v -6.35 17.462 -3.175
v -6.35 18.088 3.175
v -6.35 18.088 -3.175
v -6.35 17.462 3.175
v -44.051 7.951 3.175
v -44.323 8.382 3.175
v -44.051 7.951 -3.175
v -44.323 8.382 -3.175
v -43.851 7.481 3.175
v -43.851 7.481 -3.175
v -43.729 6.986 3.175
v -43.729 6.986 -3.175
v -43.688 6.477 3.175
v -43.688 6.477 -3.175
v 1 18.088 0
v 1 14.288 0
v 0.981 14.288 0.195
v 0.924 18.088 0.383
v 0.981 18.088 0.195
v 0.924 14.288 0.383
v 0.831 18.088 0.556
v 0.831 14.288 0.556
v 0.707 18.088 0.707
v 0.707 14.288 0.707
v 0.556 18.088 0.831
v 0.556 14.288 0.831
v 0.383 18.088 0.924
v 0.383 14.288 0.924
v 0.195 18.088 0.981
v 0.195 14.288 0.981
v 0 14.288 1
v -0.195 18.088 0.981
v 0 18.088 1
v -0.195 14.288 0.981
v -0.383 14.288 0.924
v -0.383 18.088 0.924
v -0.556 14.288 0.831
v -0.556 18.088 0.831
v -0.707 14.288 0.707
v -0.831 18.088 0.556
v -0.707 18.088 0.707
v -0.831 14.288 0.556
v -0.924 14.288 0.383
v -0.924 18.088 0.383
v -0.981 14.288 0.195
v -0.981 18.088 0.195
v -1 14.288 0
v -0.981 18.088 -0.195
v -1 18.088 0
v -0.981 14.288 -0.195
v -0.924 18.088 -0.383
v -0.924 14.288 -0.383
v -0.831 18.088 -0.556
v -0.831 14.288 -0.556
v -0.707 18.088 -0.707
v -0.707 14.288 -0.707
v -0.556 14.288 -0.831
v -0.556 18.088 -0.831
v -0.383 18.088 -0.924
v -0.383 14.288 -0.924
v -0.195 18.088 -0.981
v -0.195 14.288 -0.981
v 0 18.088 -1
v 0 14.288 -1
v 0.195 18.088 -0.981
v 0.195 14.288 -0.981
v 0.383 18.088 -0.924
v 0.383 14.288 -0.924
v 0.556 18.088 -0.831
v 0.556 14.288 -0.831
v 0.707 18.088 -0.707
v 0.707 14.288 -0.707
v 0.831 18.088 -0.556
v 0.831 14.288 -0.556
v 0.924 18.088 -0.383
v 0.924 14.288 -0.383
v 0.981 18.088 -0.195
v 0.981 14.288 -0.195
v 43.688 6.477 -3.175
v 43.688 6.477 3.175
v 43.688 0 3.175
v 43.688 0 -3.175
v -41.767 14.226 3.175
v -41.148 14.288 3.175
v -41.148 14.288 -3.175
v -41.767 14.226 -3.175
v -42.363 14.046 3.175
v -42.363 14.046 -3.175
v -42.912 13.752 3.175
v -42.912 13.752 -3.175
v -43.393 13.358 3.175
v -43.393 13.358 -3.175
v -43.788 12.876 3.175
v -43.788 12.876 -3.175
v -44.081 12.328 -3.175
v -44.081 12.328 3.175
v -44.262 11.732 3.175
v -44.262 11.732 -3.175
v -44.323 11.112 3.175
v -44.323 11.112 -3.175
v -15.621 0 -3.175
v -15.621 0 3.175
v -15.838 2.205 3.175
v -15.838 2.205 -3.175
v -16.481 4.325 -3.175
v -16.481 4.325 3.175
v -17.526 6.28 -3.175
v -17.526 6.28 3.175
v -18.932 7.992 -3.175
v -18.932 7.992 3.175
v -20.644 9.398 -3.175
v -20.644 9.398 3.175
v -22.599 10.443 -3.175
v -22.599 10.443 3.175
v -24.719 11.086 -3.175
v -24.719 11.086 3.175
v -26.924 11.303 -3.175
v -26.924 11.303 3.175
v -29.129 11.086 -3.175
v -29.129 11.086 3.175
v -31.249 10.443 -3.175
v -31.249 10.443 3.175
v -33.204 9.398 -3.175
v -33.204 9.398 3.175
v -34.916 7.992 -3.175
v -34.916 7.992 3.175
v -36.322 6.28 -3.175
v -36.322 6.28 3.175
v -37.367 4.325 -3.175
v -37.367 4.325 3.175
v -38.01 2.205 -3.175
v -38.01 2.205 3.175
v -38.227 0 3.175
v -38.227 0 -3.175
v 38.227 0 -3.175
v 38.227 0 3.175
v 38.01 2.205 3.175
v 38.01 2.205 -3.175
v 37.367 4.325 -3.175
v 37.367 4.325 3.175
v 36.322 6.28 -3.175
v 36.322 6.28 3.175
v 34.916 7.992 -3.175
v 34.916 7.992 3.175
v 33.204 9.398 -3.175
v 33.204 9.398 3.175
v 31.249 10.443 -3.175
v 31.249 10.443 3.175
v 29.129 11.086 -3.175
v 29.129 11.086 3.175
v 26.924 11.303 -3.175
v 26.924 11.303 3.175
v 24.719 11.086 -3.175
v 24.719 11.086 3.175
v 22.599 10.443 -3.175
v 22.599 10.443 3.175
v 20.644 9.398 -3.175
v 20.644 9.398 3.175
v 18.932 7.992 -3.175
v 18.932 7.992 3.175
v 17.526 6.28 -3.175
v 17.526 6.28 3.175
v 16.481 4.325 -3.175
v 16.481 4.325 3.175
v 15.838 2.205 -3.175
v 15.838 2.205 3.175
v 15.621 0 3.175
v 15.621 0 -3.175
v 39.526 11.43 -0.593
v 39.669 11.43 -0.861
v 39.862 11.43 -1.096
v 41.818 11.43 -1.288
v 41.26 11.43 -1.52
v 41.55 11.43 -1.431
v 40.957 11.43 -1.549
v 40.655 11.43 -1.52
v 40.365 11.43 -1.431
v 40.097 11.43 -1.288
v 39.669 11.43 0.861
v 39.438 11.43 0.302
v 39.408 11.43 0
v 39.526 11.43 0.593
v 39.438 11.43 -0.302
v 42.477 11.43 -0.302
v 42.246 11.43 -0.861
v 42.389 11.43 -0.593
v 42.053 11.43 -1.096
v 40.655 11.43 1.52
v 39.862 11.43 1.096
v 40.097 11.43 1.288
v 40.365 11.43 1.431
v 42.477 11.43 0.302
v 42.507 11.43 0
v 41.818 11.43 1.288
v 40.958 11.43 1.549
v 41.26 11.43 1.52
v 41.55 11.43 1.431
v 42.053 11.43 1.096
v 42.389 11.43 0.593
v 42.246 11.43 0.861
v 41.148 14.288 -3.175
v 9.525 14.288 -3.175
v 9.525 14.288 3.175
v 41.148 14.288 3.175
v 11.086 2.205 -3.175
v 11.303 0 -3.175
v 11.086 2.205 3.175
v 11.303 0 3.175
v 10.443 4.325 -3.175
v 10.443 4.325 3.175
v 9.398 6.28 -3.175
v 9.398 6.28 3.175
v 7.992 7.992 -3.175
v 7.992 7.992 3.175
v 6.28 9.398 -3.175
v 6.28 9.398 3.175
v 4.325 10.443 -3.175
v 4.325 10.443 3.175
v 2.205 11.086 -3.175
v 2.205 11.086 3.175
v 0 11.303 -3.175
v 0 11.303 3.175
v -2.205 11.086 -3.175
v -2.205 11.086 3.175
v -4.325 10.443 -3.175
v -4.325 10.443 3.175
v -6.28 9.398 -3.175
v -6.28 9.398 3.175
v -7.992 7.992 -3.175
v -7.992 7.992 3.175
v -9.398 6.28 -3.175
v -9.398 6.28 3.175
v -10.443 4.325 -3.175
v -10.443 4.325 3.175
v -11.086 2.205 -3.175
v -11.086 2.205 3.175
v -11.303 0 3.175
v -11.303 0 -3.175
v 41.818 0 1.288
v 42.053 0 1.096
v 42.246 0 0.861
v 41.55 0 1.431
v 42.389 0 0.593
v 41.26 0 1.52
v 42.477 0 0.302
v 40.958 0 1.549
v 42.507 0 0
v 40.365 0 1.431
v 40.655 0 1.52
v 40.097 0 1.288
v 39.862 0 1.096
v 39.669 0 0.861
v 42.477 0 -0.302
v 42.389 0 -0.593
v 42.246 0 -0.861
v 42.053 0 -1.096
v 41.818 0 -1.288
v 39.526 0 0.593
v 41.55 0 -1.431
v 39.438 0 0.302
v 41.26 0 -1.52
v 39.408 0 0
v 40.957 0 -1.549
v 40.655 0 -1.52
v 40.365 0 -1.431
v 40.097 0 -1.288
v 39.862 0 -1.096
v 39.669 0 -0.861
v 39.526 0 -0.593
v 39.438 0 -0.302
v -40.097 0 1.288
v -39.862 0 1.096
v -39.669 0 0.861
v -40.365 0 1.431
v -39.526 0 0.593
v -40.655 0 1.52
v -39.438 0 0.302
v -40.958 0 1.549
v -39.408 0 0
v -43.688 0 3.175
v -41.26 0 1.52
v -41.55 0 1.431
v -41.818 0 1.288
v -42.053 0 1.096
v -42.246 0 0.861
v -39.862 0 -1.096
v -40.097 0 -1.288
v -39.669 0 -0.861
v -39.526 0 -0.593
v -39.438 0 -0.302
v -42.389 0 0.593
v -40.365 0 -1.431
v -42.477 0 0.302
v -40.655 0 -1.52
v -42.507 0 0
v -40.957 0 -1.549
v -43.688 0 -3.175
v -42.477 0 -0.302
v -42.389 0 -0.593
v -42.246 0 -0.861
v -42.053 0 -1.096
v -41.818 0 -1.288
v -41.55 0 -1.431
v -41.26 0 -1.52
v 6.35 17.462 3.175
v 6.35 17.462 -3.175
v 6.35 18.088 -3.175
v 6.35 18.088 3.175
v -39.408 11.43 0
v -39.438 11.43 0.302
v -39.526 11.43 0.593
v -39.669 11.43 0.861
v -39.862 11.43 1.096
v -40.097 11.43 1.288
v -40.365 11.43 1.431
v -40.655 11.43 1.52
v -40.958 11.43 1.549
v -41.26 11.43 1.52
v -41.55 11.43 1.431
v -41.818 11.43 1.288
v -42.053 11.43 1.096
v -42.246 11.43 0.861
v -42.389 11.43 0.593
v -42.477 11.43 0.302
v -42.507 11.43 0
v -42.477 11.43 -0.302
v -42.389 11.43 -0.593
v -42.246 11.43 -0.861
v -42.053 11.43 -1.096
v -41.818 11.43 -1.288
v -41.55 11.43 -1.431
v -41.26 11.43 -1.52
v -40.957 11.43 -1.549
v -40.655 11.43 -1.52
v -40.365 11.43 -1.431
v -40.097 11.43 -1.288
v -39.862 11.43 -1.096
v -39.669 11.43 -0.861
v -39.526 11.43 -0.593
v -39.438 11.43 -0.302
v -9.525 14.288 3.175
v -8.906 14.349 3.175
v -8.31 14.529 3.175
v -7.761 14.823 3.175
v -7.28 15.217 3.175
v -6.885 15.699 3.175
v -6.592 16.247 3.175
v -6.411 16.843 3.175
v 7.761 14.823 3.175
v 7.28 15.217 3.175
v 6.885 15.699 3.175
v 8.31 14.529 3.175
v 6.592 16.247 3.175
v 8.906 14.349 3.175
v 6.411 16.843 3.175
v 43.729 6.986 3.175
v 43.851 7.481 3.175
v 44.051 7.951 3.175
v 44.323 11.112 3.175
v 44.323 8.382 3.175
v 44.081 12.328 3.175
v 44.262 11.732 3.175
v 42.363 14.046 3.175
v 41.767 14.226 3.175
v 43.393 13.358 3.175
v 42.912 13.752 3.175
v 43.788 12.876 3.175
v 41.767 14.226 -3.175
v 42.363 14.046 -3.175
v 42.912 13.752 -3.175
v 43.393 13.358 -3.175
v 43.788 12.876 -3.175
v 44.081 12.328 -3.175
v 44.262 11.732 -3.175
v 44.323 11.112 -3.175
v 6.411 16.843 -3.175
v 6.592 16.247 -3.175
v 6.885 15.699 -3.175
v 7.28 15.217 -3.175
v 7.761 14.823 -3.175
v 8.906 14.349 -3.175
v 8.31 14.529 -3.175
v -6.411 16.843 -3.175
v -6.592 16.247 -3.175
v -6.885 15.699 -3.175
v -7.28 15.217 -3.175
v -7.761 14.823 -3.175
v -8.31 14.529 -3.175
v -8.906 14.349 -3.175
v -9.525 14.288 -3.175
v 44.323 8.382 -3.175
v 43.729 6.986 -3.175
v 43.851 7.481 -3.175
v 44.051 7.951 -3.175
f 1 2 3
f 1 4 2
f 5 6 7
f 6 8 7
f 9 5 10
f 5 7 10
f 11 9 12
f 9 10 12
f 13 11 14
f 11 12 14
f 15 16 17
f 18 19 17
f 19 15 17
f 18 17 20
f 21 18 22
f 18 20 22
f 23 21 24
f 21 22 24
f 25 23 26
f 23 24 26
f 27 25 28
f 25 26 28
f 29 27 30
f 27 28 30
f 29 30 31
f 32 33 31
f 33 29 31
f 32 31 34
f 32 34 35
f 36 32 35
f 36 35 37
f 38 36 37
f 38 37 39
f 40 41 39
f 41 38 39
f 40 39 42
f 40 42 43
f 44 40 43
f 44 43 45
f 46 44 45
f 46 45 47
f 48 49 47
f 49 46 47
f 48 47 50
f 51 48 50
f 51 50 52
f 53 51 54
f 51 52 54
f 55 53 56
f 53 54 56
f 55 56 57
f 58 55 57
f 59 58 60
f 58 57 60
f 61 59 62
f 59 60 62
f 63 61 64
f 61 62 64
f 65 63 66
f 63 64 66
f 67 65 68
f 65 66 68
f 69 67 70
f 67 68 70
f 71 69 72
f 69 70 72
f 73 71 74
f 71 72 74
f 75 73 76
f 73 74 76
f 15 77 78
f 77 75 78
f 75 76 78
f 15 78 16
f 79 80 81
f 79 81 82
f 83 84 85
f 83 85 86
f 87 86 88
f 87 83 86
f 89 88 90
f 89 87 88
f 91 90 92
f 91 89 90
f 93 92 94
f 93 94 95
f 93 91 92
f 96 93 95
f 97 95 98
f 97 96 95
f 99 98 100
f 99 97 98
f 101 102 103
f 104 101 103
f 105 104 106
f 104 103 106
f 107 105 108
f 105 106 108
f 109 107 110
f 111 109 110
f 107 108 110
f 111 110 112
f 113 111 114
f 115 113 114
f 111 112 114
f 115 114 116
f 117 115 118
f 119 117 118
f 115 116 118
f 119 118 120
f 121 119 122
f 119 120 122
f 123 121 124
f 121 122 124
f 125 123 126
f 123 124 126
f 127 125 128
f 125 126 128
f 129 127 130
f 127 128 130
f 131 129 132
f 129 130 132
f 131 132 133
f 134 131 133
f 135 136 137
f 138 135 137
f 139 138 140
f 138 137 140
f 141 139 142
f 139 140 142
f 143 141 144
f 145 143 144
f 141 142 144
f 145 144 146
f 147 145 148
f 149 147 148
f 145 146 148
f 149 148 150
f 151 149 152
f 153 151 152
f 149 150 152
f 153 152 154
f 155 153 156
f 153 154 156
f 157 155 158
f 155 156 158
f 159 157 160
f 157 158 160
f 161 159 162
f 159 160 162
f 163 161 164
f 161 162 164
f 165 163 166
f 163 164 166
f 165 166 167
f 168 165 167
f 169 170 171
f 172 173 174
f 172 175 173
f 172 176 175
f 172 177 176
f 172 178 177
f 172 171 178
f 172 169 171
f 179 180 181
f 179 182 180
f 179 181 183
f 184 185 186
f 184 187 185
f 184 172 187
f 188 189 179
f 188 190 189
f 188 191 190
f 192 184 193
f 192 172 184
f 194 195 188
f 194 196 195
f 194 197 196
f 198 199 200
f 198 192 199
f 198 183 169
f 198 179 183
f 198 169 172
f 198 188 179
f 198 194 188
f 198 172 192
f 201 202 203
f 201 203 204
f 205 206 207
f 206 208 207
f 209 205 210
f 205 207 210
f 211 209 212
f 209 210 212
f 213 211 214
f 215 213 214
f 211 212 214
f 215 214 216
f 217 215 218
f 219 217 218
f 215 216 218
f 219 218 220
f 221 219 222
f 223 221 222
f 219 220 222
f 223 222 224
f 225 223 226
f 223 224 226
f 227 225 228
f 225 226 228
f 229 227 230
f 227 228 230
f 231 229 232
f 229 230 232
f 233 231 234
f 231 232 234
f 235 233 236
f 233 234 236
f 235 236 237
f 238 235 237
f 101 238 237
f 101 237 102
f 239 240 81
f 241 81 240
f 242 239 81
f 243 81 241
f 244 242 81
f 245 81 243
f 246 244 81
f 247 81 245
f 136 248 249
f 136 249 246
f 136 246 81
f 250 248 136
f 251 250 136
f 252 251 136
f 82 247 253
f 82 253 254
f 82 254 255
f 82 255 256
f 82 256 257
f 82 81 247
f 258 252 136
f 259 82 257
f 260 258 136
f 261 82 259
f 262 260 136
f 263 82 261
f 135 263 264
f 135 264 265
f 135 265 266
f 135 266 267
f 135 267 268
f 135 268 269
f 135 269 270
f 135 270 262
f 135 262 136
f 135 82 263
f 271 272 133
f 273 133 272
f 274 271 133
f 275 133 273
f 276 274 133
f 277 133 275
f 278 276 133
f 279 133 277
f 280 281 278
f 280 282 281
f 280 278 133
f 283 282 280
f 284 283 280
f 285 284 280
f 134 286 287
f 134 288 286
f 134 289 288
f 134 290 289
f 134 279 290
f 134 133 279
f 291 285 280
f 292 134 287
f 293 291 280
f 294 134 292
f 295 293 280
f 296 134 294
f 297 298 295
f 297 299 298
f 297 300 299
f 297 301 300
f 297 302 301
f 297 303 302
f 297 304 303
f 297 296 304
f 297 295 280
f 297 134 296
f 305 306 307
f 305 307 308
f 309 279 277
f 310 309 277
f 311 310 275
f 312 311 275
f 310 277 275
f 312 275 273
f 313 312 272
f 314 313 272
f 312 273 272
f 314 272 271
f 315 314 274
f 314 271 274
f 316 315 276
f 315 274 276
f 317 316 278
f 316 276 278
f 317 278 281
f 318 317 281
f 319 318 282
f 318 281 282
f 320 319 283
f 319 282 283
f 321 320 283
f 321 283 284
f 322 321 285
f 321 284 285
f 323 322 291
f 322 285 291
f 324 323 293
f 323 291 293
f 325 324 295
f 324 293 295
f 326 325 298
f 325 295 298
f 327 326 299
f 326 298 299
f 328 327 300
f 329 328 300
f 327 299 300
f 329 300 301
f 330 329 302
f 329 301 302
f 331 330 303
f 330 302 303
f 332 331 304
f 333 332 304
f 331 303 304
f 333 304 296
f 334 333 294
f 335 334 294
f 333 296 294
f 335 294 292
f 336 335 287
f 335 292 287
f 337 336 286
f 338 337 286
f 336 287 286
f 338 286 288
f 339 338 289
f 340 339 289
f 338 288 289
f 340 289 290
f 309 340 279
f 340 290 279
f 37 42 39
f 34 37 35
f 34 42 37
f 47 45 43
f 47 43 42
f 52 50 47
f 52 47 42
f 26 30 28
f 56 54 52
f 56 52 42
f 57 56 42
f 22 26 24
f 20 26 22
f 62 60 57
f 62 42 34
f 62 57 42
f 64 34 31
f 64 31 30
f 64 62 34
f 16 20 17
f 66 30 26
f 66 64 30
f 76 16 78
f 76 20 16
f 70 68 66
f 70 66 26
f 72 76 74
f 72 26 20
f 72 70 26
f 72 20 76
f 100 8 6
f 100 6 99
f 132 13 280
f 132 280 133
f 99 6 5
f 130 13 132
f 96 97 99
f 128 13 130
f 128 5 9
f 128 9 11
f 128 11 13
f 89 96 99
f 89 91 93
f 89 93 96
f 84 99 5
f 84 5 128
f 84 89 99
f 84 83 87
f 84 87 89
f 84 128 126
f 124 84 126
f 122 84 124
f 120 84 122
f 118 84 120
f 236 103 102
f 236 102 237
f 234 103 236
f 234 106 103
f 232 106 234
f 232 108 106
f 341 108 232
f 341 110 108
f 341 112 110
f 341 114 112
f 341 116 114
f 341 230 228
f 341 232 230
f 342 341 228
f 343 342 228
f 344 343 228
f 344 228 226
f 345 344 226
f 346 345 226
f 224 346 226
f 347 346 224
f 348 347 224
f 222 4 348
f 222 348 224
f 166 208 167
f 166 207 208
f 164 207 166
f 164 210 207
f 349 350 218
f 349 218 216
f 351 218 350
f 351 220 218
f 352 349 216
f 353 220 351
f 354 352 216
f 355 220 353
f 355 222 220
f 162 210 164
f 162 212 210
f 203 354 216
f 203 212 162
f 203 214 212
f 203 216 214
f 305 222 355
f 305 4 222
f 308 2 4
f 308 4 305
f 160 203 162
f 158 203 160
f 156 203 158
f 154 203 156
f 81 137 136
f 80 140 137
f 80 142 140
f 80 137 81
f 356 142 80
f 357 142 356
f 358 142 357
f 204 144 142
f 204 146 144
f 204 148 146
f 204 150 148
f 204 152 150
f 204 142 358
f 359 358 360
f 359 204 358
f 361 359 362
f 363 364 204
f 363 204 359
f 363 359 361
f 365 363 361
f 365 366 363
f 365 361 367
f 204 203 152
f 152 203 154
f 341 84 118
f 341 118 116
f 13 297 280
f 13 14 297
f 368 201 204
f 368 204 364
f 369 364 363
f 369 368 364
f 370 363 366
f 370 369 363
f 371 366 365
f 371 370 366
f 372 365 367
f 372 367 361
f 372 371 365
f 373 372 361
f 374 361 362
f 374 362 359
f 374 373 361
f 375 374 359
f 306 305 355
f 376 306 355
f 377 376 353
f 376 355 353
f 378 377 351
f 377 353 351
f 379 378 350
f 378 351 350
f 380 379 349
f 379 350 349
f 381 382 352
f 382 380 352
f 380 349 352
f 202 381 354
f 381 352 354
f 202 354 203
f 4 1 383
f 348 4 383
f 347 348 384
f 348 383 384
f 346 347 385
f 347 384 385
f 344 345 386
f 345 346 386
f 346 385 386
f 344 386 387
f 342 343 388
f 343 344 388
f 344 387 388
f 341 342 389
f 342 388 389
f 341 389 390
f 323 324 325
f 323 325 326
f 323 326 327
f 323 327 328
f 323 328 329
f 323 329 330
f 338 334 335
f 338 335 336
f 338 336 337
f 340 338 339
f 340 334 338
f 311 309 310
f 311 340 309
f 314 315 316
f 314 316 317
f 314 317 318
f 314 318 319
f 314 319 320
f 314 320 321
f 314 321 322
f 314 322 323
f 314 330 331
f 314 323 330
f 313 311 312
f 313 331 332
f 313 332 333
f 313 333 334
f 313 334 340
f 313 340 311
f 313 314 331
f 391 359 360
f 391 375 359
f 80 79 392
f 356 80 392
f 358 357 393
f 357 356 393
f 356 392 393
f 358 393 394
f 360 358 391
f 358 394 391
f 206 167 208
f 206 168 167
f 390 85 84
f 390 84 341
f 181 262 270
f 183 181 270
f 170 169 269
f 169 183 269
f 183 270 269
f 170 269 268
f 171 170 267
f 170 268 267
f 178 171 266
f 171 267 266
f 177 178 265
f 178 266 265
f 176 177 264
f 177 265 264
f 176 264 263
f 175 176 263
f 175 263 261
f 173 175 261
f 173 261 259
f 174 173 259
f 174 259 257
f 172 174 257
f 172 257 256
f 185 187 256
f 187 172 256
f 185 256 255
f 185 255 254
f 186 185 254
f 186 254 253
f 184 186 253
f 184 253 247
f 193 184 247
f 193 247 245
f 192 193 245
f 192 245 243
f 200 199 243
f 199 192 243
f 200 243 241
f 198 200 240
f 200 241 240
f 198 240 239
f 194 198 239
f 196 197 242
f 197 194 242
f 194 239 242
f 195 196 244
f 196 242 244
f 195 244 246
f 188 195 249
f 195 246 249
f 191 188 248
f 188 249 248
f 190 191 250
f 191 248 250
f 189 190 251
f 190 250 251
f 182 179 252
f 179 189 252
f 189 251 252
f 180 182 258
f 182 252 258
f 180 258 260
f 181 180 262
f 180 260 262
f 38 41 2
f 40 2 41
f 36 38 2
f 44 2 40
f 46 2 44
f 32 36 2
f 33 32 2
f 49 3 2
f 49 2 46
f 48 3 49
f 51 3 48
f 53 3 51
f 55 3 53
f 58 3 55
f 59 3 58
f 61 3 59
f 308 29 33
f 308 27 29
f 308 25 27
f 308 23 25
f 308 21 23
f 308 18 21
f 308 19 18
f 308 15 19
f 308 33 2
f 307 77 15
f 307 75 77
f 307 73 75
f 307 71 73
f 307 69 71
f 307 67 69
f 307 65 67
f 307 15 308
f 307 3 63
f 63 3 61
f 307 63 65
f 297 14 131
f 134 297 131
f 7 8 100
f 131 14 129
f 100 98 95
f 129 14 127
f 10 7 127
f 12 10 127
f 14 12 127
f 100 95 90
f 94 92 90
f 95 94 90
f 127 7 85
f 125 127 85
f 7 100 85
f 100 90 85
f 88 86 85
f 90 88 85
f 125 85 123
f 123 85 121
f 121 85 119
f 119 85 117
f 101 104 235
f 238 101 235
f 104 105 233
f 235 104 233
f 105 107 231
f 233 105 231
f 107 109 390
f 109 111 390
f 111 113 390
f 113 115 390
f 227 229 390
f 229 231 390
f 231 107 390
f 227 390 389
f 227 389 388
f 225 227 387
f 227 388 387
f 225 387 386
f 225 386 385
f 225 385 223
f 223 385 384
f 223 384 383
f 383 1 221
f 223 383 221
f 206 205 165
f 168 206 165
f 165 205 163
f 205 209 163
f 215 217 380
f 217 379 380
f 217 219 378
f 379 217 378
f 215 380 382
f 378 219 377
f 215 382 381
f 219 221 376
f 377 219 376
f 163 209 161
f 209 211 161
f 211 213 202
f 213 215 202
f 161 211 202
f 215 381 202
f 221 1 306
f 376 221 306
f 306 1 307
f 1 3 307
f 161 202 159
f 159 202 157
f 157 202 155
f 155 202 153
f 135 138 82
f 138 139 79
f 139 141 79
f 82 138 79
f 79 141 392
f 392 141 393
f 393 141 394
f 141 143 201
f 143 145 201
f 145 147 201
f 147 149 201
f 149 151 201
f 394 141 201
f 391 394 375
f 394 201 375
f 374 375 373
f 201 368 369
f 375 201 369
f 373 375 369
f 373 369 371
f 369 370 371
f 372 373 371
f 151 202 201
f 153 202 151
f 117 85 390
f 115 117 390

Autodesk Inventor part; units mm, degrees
ref_plane "YZ Plane" through (0, 0, 0) normal (1, 0, 0) x (0, 1, 0)
ref_plane "XZ Plane" through (0, 0, 0) normal (0, 1, 0) x (-1, 0, 0)
ref_plane "XY Plane" through (0, 0, 0) normal (0, 0, 1) x (1, 0, 0)
sketch "Sketch1" plane through (0, 0, 0) normal (0, 0, 1) x (1, 0, 0)
  line L0 (-44.323, 14.2875) -> (44.323, 14.2875)
  line L1 (44.323, 14.2875) -> (44.323, -14.2875)
  line L2 (44.323, -14.2875) -> (-44.323, -14.2875)
  line L3 (-44.323, -14.2875) -> (-44.323, 14.2875)
  point P0 (0, 0)
  dimension "d0" = 88.646
  dimension "d1" = 44.323
  dimension "d2" = 14.2875
  dimension "d3" = 28.575
extrude "Extrusion1" add sketch "Sketch1" along normal mid plane 6.35
sketch "Sketch2" plane through (0, 0, 3.175) normal (0, 0, 1) x (1, 0, 0)
  circle A0 centre (-26.924, 0) radius 11.303
  circle A1 centre (0, 0) radius 11.303
  line L0 (44.323, -14.2875) -> (44.323, 14.2875) projected
  circle A2 centre (26.924, 0) radius 11.303
  line L1 (-44.323, 14.2875) -> (-44.323, -14.2875) projected
  line L2 (-44.323, 0) -> (44.323, 0) construction
  line L3 (44.323, 14.2875) -> (-44.323, 14.2875) projected
  point P0 (0, 0)
  dimension "d6" = 22.606
  dimension "d9" = 22.606
  dimension "d11" = 22.606
  dimension "d14" = 26.924
  dimension "d21" = 88.646
  dimension "d22" = 26.924
  dimension "d45" = 0
sketch "Sketch4" plane through (-44.323, -14.2875, -3.175) normal (-1, 0, 0) x (0, 0, 1)
  line L0 (0, 0) -> (0, 28.575) projected
  line L1 (6.35, 28.575) -> (6.35, 0) projected
  line L2 (0, 22.6695) -> (6.35, 22.6695)
  line L3 (6.35, 22.6695) -> (6.35, 5.9055)
  line L4 (6.35, 5.9055) -> (0, 5.9055)
  line L5 (0, 5.9055) -> (0, 22.6695)
  point P0 (3.175, 14.2875)
  dimension "d30" = 8.382
  dimension "d31" = 16.764
extrude "Extrusion3" cut sketch "Sketch4" against normal blind 0.635
mirror "Mirror1" about plane through (0, 0, 0) normal (1, 0, 0) of "Extrusion3"
sketch "Sketch7" plane through (-44.323, -14.2875, 3.175) normal (0, -1, 0) x (1, 0, 0)
  line L0 (30.353, -14.605) -> (58.293, -14.605)
  line L1 (58.293, -14.605) -> (58.293, 8.255)
  line L2 (58.293, 8.255) -> (30.353, 8.255)
  line L3 (30.353, 8.255) -> (30.353, -14.605)
  point P0 (44.323, -3.175)
  dimension "d39" = 27.94
  dimension "d40" = 22.86
  dimension "d41" = 11.43
  dimension "d42" = 13.97
extrude "Extrusion5" [suppressed]
extrude "Extrusion6" cut sketch "Sketch2" against normal blind 25.4
sketch "Sketch8" plane through (0, 0, -3.175) normal (0, 0, -1) x (-1, 0, 0)
  line L0 (43.688, 8.382) -> (43.688, -8.382) construction
  line L1 (43.688, 0) -> (-43.688, 0)
  line L2 (-43.688, 8.382) -> (-43.688, -8.382) construction
  line L3 (44.323, 14.2875) -> (-44.323, 14.2875) projected
  line L4 (44.323, 8.382) -> (44.323, 14.2875) projected
  line L5 (-44.323, 14.2875) -> (-44.323, 8.382) projected
  line L6 (-43.688, 8.382) -> (-43.688, 0)
  line L7 (-44.323, 8.382) -> (-43.688, 8.382) projected
  line L8 (43.688, 8.382) -> (43.688, 0)
  line L9 (43.688, 8.382) -> (44.323, 8.382) projected
  point P0 (0, 0)
extrude "Extrusion7" [suppressed]
sketch "Sketch9" plane through (0, 0, -3.175) normal (0, 0, -1) x (-1, 0, 0)
  line L0 (-44.323, -14.2875) -> (44.323, -14.2875) projected
  line L1 (44.323, -14.2875) -> (44.323, -8.382) projected
  line L2 (44.323, -8.382) -> (43.688, -8.382) projected
  line L3 (-43.688, -8.382) -> (-44.323, -8.382) projected
  line L4 (-44.323, -8.382) -> (-44.323, -14.2875) projected
  line L5 (-43.688, 8.382) -> (-43.688, -8.382) projected
  line L6 (-43.688, 0) -> (-43.688, -8.382)
  line L7 (-43.688, 0) -> (43.688, 0)
  line L8 (43.688, -8.382) -> (43.688, 8.382) projected
  line L9 (43.688, -8.382) -> (43.688, 0)
  point P0 (0, 0)
extrude "Extrusion8" cut sketch "Sketch9" against normal through all
sketch "Sketch10" plane through (-43.688, 0, -3.175) normal (0, -1, 0) x (1, 0, 0)
  line L0 (5.461, 6.35) -> (5.461, 0) projected
  line L1 (0, 0) -> (0, 6.35) projected
  line L2 (-0.635, 0) -> (-0.635, 6.35) projected
  line L3 (5.461, 6.35) -> (5.461, 0) projected
  line L4 (0, 6.35) -> (5.461, 6.35) projected
  line L5 (0, 0) -> (0, 6.35) projected
  line L6 (5.461, 0) -> (0, 0) projected
  circle A0 centre (2.7305, 3.175) radius 1.5494
  line L7 (86.614, 1.27) -> (80.264, 1.27) projected
  line L8 (86.614, 0) -> (80.264, 0) projected
  point P0 (43.688, 3.175)
  point P1 (84.328, 1.27)
  point P2 (77.978, 1.27)
  point P3 (84.328, 0)
  point P4 (77.978, 0)
  dimension "d58" = 3.0988
  dimension "d61" = 5.461
  dimension "d62" = 2.7305
  dimension "d78" = 3.175
  dimension "d90" = 6.35
extrude "Extrusion9" cut sketch "Sketch10" against normal blind 11.43 contours A0
mirror "Mirror2" about plane through (0, 0, 0) normal (1, 0, 0) of "Extrusion9"
thread "Thread1" size "5-40 UNC" class "2B" standard "ANSI Unified Screw Threads" full length
thread "Thread2" size "5-40 UNC" class "2B" standard "ANSI Unified Screw Threads" full length
fillet "Fillet1" radius 3.175 2 edges at (-44.323, 14.2875, 0) (44.323, 14.2875, 0)
sketch "Sketch12" plane through (-41.148, 14.2875, -3.175) normal (0, 1, 0) x (1, 0, 0)
  line L0 (82.296, -6.35) -> (0, -6.35) projected
  line L1 (34.798, 0) -> (47.498, 0)
  line L2 (47.498, 0) -> (47.498, -6.35)
  line L3 (47.498, -6.35) -> (34.798, -6.35)
  line L4 (34.798, -6.35) -> (34.798, 0)
  circle A0 centre (41.148, -3.175) radius 1
  line L5 (29.845, 0) -> (52.451, 0) projected
  dimension "d81" = 6.35
  dimension "d82" = 12.7
  dimension "d83" = 2
  dimension "d87" = 0
extrude "Extrusion11" add sketch "Sketch12" along normal blind 3.8
fillet "Fillet3" radius 3.175 2 edges at (6.35, 14.2875, 0) (-6.35, 14.2875, 0)
thread "Thread3" size "M2x0.4" class "6H" standard "ANSI Metric M Profile" full length
fillet "Fillet4" radius 3.175 2 edges at (43.688, 8.382, 0) (-43.688, 8.382, 0)
equation "\"d1\" = 0.5 * d0"
equation "\"d2\" = 0.5 * d3"
equation "\"d9\" = d7"
equation "\"d11\" = d9"
equation "\"d22\" = d14"
equation "\"d30\" = 0.5 * d31"
equation "\"d41\" = 0.5 * d40"
equation "\"d42\" = 0.5 * d39"
equation "\"d62\" = 0.5 * d61"
equation "\"d78\" = 0.5 * d90"
equation "\"d81\" = 0.5 * d82"
equation "\"d7\" = d6"
properties part number "Tube Holder Halve 2" material "Aluminum 6061-AHC"
